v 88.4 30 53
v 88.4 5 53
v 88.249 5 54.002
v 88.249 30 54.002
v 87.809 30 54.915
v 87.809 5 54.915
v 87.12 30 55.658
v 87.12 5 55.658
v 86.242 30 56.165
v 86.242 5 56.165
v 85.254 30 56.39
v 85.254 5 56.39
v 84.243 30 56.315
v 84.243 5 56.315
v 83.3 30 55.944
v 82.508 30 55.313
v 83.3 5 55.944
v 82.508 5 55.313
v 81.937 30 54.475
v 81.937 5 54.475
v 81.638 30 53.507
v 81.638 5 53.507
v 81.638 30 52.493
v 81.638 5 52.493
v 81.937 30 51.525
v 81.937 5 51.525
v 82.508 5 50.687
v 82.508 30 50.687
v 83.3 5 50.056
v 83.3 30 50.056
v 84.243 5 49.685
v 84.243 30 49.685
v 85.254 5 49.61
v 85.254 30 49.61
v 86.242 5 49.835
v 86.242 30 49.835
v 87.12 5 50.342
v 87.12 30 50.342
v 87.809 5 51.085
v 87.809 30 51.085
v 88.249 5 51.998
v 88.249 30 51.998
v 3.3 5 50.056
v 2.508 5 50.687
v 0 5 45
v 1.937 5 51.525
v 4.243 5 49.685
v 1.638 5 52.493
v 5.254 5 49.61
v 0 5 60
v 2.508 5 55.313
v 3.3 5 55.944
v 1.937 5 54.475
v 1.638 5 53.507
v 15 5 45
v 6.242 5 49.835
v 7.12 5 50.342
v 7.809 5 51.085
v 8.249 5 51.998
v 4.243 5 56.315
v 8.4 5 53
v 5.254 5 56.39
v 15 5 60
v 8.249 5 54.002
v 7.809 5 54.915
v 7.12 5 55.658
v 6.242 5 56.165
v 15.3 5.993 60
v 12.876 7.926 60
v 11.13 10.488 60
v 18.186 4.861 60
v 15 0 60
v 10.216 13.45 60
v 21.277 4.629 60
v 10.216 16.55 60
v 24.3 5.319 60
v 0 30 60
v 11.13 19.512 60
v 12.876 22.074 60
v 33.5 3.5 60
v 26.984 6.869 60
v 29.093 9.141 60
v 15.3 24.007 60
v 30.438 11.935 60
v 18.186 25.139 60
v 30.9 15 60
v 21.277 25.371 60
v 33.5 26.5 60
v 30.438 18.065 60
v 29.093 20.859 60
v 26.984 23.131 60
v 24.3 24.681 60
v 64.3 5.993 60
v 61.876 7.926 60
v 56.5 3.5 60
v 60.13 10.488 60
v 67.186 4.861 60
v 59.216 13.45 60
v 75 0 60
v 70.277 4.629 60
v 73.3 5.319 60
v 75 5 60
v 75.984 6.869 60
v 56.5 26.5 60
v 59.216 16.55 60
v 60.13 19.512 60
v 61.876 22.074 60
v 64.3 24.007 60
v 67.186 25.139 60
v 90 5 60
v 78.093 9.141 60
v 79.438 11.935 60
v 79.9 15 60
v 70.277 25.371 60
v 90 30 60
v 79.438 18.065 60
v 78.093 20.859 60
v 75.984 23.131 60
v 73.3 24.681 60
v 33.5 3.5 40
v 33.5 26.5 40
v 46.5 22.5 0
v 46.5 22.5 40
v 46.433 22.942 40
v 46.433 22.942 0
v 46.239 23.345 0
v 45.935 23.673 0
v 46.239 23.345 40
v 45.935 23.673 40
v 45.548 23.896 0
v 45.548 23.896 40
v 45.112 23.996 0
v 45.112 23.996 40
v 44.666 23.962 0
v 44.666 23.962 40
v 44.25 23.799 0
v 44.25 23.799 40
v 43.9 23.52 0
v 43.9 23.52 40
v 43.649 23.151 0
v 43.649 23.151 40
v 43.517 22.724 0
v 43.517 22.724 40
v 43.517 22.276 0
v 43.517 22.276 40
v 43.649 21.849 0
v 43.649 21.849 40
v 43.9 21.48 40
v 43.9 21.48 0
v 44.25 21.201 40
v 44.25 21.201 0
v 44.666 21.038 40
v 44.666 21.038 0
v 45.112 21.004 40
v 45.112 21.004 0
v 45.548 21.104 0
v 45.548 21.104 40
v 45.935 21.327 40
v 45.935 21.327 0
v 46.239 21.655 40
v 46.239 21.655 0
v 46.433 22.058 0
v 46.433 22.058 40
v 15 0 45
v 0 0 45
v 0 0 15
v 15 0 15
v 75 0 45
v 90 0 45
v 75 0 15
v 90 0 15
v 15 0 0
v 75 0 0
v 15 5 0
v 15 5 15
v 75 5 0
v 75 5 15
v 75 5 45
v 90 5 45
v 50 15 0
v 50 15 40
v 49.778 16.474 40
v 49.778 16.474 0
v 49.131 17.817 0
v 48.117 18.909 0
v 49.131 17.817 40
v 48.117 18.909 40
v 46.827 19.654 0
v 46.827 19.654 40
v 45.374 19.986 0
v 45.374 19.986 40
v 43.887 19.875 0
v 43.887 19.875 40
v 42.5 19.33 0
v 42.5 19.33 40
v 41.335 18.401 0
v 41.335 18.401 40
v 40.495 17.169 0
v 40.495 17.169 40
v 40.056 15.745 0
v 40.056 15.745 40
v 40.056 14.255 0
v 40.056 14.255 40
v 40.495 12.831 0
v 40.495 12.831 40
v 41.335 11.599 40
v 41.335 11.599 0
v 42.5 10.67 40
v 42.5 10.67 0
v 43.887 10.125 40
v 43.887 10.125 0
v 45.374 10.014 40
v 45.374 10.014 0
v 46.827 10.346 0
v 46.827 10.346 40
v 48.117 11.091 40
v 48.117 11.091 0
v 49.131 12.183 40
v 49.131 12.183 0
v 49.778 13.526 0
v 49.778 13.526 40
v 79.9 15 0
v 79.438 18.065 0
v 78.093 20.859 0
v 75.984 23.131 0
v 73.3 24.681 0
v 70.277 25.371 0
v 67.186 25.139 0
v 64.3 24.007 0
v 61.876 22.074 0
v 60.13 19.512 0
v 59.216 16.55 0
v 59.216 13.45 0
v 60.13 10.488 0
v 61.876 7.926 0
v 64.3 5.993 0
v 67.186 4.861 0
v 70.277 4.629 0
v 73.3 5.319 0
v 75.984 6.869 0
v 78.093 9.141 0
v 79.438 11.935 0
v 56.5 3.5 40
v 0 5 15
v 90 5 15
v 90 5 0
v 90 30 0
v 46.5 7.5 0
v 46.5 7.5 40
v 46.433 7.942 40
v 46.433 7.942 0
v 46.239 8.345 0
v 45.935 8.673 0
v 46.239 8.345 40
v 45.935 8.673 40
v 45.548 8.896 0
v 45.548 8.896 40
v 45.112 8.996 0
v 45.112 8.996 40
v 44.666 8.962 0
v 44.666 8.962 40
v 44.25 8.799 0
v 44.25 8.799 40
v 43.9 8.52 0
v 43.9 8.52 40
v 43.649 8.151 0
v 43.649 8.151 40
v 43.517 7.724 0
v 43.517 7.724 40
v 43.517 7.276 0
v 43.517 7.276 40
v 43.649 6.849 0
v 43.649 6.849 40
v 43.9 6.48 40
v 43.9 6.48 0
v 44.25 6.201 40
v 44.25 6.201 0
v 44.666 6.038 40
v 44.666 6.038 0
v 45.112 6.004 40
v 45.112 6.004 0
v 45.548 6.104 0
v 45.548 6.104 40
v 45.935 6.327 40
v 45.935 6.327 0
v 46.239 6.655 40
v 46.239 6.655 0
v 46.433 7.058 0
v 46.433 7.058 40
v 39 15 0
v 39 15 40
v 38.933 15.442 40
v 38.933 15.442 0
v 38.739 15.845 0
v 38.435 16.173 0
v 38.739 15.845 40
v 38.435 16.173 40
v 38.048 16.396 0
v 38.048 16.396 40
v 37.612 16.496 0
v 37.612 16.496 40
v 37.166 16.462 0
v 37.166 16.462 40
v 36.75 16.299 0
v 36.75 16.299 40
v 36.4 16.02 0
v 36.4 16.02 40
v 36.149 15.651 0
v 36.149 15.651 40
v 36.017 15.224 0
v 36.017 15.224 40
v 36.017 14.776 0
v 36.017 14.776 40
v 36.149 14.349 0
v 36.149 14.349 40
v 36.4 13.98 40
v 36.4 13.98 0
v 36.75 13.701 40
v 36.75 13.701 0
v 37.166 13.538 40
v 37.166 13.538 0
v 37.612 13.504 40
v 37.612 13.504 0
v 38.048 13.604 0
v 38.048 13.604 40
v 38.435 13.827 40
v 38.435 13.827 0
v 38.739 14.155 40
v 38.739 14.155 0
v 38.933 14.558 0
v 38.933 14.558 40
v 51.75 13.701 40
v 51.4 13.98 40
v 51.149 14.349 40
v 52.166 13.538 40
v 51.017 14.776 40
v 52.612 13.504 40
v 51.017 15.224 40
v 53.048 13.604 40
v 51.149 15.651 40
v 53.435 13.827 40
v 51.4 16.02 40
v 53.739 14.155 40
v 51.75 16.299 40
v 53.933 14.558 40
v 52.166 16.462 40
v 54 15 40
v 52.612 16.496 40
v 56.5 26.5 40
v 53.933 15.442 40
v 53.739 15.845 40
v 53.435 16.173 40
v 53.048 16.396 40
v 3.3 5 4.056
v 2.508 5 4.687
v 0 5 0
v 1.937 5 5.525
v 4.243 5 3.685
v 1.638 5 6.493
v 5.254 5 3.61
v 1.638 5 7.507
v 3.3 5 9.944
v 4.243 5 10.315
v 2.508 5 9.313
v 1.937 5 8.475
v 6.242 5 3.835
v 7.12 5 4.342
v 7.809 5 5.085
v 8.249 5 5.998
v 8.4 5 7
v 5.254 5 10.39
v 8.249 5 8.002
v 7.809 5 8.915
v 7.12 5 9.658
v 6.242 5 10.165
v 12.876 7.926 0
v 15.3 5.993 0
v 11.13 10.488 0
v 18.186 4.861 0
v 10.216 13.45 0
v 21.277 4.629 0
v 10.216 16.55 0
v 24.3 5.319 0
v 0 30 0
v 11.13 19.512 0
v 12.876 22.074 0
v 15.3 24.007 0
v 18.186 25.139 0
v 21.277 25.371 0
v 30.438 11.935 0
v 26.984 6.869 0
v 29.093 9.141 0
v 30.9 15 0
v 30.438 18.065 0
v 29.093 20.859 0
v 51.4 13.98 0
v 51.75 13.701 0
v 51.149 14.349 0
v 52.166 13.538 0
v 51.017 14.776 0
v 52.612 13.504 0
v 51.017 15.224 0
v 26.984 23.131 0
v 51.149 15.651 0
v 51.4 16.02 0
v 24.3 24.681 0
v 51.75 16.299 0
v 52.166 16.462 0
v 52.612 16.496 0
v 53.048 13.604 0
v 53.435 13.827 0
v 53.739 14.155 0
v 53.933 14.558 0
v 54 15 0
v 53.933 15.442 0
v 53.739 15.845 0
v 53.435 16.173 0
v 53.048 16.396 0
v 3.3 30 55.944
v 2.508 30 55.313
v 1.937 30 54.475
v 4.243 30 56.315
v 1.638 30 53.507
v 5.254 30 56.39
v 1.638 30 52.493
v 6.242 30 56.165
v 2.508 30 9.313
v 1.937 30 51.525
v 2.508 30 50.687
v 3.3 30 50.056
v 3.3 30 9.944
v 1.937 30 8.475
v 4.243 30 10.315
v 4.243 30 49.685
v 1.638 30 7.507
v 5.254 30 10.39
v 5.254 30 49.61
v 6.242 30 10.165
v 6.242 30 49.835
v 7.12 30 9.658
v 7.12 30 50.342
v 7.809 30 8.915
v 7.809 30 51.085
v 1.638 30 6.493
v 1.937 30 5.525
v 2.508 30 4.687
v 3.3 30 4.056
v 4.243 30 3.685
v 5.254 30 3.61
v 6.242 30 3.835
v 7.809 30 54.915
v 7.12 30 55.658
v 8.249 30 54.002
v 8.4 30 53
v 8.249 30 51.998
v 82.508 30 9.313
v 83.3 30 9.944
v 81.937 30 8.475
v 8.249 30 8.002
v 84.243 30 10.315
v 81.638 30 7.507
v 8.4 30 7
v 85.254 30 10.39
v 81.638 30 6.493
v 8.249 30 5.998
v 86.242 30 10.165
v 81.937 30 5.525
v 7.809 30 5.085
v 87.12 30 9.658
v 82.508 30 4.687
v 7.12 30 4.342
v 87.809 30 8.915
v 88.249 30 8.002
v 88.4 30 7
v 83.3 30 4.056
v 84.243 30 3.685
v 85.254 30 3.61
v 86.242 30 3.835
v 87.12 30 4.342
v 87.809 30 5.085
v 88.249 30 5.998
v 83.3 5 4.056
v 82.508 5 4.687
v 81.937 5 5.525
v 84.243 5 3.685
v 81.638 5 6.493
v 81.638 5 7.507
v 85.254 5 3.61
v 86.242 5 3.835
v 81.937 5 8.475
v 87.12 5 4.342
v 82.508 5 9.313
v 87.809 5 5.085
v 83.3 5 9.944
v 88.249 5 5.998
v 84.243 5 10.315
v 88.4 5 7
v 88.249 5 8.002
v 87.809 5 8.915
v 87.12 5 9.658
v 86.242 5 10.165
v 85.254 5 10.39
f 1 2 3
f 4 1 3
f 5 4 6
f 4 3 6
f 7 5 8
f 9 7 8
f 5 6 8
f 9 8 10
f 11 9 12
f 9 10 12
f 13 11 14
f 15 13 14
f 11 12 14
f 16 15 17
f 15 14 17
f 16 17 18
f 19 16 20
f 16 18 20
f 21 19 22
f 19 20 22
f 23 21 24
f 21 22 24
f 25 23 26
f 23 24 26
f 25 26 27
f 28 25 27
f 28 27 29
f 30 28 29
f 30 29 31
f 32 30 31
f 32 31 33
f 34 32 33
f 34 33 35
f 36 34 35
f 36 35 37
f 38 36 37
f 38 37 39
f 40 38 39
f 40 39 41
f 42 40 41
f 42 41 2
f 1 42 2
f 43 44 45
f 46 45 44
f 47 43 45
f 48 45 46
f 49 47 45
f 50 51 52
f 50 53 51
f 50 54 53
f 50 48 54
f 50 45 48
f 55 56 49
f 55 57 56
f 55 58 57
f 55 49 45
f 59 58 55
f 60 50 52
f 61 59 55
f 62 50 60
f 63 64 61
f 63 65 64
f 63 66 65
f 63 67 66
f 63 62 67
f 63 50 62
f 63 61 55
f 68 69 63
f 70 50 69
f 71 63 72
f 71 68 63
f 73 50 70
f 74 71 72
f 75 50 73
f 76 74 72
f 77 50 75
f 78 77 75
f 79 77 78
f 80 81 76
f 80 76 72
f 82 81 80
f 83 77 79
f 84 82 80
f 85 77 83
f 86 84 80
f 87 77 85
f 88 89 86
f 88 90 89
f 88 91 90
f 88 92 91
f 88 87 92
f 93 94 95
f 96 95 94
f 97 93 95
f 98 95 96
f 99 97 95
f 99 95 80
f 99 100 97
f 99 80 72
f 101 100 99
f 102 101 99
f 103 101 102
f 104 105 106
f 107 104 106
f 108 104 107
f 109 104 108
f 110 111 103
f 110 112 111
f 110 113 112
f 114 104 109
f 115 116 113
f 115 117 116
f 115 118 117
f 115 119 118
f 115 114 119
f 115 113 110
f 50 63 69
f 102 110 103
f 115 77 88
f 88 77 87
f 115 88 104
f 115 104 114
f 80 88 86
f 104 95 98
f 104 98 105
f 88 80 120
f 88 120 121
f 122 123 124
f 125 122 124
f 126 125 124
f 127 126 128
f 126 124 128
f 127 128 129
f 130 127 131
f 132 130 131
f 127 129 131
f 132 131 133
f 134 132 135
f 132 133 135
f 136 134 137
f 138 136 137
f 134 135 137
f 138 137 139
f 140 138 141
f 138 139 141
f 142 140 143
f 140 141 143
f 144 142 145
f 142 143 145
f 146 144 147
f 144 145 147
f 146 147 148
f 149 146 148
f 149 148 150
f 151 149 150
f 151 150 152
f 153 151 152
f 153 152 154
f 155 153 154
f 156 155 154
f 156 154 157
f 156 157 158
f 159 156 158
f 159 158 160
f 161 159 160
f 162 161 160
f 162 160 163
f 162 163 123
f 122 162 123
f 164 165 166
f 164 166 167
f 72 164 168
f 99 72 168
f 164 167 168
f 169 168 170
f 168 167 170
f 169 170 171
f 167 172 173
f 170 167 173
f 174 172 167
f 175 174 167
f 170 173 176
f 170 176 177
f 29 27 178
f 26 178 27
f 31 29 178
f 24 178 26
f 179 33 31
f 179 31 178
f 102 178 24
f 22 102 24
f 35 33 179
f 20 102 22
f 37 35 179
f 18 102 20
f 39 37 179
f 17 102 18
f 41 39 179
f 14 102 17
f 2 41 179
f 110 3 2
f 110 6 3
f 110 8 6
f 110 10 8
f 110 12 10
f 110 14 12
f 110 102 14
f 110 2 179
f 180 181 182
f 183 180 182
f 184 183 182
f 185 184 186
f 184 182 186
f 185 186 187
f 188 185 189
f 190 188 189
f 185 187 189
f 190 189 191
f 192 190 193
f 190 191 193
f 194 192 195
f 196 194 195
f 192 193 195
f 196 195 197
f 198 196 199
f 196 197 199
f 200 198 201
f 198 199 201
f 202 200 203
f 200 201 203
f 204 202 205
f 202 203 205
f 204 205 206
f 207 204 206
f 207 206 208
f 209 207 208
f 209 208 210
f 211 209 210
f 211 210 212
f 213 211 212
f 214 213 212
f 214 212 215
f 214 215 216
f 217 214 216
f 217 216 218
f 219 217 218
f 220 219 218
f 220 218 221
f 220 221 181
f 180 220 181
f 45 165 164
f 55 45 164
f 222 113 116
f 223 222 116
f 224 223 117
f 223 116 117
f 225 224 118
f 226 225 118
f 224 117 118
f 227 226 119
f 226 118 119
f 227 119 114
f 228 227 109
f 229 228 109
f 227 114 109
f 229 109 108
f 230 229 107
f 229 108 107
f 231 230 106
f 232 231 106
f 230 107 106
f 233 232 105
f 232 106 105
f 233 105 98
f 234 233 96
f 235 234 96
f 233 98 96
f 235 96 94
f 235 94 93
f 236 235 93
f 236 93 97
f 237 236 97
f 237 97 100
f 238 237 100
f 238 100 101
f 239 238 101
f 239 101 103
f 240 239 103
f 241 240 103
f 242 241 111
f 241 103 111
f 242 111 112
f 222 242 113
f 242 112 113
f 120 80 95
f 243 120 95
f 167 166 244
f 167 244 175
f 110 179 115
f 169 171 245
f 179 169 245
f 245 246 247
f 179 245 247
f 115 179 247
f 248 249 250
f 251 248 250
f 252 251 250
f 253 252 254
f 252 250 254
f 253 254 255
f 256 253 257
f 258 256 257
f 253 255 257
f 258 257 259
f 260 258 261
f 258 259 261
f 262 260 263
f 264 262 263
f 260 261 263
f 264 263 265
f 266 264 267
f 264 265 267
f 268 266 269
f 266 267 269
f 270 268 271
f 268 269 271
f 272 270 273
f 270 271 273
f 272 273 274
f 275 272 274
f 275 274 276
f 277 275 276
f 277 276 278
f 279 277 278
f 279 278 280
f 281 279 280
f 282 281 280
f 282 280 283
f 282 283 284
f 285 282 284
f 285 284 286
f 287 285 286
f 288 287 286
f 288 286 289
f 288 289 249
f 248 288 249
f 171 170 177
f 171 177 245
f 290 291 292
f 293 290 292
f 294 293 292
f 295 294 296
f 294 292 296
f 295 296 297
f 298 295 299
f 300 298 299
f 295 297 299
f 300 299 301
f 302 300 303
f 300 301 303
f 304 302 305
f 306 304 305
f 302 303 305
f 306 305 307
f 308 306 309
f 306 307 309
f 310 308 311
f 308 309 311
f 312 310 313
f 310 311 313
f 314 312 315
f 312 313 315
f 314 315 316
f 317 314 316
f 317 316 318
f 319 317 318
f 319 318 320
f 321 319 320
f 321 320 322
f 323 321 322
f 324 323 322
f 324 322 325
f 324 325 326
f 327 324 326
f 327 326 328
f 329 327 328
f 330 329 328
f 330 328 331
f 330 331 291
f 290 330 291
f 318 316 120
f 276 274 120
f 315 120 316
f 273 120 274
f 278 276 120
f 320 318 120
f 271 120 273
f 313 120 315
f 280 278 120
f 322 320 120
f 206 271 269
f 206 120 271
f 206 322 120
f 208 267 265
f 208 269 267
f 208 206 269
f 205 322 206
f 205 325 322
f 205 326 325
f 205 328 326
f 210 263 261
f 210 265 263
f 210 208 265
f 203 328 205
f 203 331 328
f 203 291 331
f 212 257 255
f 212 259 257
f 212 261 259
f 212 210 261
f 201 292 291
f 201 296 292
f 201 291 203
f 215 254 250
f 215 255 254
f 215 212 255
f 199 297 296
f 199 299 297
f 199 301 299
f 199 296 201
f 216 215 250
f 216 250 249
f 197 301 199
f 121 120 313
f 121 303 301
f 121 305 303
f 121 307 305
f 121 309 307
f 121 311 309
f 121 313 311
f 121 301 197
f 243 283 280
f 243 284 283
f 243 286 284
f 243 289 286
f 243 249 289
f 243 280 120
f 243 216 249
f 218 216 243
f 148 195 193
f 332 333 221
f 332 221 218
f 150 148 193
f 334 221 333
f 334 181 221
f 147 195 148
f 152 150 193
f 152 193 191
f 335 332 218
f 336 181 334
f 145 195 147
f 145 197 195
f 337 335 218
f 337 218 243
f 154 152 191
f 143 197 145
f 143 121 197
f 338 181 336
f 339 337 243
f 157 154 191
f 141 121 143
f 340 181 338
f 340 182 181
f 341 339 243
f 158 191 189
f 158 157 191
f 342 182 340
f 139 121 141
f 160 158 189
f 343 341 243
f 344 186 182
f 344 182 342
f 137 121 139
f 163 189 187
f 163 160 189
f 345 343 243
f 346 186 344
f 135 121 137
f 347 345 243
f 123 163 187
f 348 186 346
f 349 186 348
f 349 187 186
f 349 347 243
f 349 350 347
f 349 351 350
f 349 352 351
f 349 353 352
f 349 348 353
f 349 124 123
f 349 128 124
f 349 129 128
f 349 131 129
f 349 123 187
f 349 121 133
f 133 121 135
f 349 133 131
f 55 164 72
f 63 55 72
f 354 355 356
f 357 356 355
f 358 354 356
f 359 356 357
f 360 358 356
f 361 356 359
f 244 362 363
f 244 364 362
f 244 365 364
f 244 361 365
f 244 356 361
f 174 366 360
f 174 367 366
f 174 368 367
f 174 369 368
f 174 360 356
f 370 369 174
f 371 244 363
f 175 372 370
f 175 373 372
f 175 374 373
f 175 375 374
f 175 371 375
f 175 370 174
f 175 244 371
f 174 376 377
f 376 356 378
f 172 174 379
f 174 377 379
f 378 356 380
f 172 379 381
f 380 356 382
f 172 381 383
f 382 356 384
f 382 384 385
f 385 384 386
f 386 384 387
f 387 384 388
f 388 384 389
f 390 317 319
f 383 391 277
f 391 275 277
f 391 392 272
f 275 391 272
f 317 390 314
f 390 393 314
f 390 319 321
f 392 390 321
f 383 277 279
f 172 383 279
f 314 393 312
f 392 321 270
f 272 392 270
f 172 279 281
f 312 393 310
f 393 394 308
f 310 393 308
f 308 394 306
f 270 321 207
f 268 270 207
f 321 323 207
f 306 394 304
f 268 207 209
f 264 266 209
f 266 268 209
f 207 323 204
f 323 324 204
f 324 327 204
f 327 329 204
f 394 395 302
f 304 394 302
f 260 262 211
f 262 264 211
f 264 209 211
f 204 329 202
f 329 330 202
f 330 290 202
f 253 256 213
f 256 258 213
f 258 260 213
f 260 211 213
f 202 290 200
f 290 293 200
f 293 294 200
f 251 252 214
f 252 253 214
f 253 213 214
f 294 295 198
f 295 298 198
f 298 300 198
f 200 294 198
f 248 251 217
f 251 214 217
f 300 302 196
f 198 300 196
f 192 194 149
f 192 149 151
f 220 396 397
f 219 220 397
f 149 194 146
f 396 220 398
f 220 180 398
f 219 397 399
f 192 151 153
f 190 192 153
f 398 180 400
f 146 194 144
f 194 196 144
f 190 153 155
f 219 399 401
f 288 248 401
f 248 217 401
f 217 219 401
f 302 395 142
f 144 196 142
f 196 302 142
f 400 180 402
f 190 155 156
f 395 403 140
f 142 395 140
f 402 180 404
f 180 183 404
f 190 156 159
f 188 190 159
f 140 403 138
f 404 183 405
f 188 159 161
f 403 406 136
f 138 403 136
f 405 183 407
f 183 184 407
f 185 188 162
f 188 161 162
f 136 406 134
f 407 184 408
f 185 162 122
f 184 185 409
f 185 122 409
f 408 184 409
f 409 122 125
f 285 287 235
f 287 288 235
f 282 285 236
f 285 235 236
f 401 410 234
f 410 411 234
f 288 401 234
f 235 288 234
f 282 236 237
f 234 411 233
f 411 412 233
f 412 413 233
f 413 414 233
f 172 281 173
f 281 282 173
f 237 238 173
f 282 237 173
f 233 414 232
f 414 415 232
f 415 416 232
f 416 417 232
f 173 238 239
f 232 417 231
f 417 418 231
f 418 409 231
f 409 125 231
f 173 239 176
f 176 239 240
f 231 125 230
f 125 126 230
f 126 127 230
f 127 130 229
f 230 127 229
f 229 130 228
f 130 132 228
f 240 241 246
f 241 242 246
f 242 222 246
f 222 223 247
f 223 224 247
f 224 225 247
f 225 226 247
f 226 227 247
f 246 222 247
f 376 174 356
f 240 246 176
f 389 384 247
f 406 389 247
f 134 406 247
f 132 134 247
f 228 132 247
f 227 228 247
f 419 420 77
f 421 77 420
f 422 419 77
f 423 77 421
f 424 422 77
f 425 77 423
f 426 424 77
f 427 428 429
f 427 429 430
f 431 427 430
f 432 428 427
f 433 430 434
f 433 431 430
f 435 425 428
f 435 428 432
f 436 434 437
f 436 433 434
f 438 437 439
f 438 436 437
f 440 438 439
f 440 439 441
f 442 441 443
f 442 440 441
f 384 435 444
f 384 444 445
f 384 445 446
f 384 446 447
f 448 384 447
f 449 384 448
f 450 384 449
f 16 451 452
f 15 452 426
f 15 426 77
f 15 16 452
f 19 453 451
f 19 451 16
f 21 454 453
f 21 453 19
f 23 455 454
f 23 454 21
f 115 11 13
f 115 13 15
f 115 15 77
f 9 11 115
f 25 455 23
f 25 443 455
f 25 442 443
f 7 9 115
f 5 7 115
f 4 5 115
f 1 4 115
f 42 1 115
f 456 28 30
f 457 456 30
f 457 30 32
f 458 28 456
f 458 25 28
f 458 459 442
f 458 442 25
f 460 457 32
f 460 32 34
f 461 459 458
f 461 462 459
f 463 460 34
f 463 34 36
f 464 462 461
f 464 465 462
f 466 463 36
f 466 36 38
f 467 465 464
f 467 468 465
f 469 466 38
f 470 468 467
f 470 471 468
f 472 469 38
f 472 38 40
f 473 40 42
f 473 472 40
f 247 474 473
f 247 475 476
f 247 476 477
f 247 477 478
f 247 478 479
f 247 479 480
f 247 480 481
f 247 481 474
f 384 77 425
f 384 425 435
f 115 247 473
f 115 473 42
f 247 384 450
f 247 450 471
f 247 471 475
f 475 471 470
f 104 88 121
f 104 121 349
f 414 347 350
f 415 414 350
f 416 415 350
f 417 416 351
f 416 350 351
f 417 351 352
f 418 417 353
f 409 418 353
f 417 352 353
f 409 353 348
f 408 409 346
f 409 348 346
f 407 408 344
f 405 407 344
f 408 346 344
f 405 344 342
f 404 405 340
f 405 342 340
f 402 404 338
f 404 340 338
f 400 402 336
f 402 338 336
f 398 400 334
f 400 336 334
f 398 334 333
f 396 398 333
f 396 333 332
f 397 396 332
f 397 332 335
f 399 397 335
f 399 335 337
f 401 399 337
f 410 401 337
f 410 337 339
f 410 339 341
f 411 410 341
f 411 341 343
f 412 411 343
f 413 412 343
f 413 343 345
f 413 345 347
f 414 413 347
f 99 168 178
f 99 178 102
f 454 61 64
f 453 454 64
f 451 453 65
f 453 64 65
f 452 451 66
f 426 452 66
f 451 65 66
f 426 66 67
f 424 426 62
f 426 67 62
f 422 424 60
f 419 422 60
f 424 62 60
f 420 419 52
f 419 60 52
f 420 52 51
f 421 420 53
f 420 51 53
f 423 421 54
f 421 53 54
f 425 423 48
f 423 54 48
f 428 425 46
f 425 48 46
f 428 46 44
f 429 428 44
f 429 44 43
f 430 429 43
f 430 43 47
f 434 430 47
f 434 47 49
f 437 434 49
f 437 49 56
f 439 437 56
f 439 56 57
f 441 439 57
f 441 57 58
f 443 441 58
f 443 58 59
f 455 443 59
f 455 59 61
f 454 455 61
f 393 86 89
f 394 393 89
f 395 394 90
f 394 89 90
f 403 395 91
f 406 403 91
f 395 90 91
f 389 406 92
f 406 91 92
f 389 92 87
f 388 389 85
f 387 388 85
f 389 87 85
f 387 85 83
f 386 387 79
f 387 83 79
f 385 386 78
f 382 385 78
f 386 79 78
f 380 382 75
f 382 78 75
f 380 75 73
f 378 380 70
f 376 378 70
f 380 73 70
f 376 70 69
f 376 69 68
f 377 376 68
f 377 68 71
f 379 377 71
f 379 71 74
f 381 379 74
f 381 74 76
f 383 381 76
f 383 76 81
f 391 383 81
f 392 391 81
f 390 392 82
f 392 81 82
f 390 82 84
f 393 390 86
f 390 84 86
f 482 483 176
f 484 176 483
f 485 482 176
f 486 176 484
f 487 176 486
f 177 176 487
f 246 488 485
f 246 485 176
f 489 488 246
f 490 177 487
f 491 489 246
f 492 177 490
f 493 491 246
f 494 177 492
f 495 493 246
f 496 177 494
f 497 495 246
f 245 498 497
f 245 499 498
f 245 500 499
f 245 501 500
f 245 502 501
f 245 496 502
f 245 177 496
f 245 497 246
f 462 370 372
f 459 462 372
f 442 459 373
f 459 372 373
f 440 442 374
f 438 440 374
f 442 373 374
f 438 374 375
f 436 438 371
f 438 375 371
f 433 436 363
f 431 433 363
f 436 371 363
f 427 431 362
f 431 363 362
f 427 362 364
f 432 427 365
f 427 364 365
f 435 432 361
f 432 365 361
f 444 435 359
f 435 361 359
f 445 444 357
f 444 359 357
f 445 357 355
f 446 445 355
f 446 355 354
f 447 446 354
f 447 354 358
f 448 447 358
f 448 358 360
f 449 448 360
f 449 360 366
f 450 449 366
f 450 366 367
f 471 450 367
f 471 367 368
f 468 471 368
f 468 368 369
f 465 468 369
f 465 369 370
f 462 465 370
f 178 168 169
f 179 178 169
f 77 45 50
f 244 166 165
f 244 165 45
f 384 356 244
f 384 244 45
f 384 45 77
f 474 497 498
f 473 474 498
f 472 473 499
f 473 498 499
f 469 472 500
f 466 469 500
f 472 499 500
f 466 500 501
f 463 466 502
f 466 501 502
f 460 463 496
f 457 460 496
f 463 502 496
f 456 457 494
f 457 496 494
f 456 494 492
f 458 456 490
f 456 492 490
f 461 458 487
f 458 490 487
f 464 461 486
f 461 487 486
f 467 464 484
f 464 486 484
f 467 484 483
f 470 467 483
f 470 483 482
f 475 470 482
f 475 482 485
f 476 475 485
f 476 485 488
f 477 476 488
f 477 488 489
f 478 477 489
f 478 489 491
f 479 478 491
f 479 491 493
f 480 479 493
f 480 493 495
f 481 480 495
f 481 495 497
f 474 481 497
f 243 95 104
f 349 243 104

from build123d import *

# Parameters (mm, degrees)
SKETCH_W        = 90
SKETCH_H        = 30
PAD_DEPTH       = 60
SKETCH001_R     = 5
SKETCH001_R_2   = 1.5
SKETCH001_R_3   = 10.4
POCKET_DEPTH    = 60
SKETCH002_R     = 3.4
POCKET001_DEPTH = 30
SKETCH003_W     = 23
SKETCH003_H     = 23
POCKET002_DEPTH = 20
SKETCH004_W     = 15
SKETCH004_H     = 15
POCKET003_DEPTH = 5


with BuildPart() as part:
    # Sketch → Pad (new body)
    with BuildSketch(Plane.XY):
        with Locations((45, 15)):
            Rectangle(SKETCH_W, SKETCH_H)
    extrude(amount=PAD_DEPTH)

    # Sketch001 (on Face6 of Pad) → Pocket (cut)
    with BuildSketch(Plane.XY.offset(60)):
        with Locations((45, 15)):
            Circle(SKETCH001_R)
        with Locations((45, 22.5)):
            Circle(SKETCH001_R_2)
        with Locations((37.5, 15)):
            Circle(SKETCH001_R_2)
        with Locations((45, 7.5)):
            Circle(SKETCH001_R_2)
        with Locations((52.5, 15)):
            Circle(SKETCH001_R_2)
        with Locations((20.5, 15)):
            Circle(SKETCH001_R_3)
        with Locations((69.5, 15)):
            Circle(SKETCH001_R_3)
    extrude(amount=-POCKET_DEPTH, mode=Mode.SUBTRACT)

    # Sketch002 (on Face6 of Pocket) → Pocket001 (cut)
    with BuildSketch(Plane.XZ):
        with Locations((5, 53)):
            Circle(SKETCH002_R)
        with Locations((5, 7)):
            Circle(SKETCH002_R)
        with Locations((85, 53)):
            Circle(SKETCH002_R)
        with Locations((85, 7)):
            Circle(SKETCH002_R)
    extrude(amount=-POCKET001_DEPTH, mode=Mode.SUBTRACT)

    # Sketch003 (on Face4 of Pocket001) → Pocket002 (cut)
    with BuildSketch(Plane.XY.offset(60)):
        with Locations((45, 15)):
            Rectangle(SKETCH003_W, SKETCH003_H)
    extrude(amount=-POCKET002_DEPTH, mode=Mode.SUBTRACT)

    # Sketch004 (on Face10 of Pocket002) → Pocket003 (cut)
    with BuildSketch(Plane.XZ):
        with Locations((7.5, 52.5)):
            Rectangle(SKETCH004_W, SKETCH004_H)
        with Locations((82.5, 52.5)):
            Rectangle(SKETCH004_W, SKETCH004_H)
        with Locations((82.5, 7.5)):
            Rectangle(SKETCH004_W, SKETCH004_H)
        with Locations((7.5, 7.5)):
            Rectangle(SKETCH004_W, SKETCH004_H)
    extrude(amount=-POCKET003_DEPTH, mode=Mode.SUBTRACT)


solid = part.part
